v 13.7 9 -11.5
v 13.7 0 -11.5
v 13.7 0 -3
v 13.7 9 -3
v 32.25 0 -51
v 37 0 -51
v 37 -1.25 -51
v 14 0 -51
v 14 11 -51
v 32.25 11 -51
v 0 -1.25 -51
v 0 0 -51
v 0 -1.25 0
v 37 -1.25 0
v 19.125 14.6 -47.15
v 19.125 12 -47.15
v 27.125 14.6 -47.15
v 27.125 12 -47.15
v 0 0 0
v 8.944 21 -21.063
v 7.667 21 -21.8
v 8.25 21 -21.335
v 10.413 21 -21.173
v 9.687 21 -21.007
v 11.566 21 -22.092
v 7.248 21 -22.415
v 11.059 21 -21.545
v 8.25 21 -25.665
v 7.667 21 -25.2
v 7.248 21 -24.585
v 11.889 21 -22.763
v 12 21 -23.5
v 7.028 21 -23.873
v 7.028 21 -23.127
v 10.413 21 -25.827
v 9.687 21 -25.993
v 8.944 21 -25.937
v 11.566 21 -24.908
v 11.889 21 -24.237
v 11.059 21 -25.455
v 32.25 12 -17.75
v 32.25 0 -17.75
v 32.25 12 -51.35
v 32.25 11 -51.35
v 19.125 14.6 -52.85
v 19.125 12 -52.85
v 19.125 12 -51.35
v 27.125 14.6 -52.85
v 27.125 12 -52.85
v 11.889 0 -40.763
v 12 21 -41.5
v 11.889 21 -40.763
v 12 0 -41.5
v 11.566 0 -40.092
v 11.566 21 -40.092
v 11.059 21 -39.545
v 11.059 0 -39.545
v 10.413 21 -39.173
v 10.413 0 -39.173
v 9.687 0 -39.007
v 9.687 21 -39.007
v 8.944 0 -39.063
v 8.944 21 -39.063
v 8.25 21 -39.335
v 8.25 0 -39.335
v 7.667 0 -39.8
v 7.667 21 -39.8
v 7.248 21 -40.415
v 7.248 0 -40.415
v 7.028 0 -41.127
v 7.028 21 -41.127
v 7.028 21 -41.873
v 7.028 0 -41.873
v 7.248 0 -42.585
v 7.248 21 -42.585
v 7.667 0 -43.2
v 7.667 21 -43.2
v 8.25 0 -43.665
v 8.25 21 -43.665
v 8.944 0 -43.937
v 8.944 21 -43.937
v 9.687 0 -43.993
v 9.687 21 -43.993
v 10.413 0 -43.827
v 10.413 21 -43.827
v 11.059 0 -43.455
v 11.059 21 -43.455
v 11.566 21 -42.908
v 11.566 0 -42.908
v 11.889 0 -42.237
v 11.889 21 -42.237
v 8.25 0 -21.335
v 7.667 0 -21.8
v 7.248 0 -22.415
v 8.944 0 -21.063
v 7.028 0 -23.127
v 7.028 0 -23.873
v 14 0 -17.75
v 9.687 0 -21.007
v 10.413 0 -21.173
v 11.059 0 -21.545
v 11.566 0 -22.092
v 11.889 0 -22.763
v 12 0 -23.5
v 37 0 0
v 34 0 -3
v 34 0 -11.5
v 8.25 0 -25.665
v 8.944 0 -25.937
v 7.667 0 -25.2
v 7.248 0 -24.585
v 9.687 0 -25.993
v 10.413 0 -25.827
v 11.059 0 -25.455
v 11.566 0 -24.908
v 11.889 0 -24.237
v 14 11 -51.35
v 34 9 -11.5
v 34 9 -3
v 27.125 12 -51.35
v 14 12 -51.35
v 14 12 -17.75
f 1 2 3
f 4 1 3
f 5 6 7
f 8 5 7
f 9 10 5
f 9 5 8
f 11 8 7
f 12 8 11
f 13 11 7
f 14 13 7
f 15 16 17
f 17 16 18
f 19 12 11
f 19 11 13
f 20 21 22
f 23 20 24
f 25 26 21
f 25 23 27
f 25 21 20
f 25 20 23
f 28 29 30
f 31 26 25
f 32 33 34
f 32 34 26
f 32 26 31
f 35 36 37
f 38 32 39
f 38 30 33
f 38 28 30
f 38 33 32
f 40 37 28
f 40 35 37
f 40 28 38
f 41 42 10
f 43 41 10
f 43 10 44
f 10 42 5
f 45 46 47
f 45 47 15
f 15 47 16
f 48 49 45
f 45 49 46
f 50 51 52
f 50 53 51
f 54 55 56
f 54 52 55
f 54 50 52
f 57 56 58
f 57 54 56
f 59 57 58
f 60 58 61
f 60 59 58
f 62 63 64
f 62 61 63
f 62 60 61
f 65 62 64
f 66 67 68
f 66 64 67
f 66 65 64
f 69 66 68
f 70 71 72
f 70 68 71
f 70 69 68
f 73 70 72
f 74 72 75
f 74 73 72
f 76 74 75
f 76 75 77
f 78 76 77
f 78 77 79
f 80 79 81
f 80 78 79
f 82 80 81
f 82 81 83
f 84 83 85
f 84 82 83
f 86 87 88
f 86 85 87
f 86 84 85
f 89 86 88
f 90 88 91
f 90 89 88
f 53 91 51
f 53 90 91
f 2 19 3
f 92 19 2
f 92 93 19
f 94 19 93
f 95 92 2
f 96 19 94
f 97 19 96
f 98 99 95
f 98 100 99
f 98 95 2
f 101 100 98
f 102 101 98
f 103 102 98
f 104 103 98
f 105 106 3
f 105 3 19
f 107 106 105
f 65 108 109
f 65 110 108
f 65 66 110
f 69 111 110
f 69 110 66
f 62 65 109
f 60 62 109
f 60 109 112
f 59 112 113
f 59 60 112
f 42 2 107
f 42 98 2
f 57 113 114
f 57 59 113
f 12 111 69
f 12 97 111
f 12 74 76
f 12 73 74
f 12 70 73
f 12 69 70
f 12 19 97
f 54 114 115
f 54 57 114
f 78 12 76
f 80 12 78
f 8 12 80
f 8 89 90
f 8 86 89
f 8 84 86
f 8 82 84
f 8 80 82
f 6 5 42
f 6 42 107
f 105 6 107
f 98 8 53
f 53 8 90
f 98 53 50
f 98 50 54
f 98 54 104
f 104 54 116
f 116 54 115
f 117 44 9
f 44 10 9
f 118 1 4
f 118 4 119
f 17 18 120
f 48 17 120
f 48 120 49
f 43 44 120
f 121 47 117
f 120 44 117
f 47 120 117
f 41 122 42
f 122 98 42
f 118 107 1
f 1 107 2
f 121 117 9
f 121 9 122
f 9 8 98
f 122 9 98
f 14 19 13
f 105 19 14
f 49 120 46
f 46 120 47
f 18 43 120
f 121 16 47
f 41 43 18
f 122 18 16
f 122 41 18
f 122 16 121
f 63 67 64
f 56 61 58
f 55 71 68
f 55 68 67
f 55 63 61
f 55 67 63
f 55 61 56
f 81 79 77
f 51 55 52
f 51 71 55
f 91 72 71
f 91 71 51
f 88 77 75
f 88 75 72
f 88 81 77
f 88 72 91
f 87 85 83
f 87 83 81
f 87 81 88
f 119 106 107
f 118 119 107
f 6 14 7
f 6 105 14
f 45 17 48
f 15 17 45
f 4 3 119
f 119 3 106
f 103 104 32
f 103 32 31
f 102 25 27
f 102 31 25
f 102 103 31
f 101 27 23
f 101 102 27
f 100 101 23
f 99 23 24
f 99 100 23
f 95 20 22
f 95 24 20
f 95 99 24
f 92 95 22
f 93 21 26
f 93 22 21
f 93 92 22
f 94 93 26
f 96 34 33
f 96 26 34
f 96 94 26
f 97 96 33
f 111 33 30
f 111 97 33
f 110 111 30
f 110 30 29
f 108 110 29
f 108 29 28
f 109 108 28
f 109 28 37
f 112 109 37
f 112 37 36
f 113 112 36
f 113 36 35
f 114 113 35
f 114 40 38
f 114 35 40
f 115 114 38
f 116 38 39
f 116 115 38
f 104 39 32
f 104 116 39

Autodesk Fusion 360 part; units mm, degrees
sketch "Sketch1" plane through (0, 0, 0) normal (0, 1, 0) x (1, 0, 0)
  line L0 (0, 0) -> (37, 0)
  line L1 (37, 0) -> (37, 51)
  line L2 (37, 51) -> (0, 51)
  line L3 (0, 51) -> (0, 0)
  line L4 (13.7, 3) -> (34, 3)
  line L5 (34, 3) -> (34, 11.5)
  line L6 (34, 11.5) -> (13.7, 11.5)
  line L7 (13.7, 11.5) -> (13.7, 3)
  line L8 (14, 17.75) -> (32.25, 17.75)
  line L9 (32.25, 17.75) -> (32.25, 51.35)
  line L10 (32.25, 51.35) -> (14, 51.35)
  line L11 (14, 51.35) -> (14, 17.75)
  line L12 (19.125, 47.15) -> (27.125, 47.15)
  line L13 (27.125, 47.15) -> (27.125, 52.85)
  line L14 (27.125, 52.85) -> (19.125, 52.85)
  line L15 (19.125, 52.85) -> (19.125, 47.15)
  circle A0 centre (9.5, 41.5) radius 2.5
  circle A1 centre (9.5, 23.5) radius 2.5
  dimension "d1" = 37
  dimension "d2" = 51
  dimension "d3" = 3
  dimension "d4" = 3
  dimension "d5" = 20.3
  dimension "d6" = 8.5
  dimension "d7" = 6.25
  dimension "d8" = 18.25
  dimension "d9" = 4.75
  dimension "d10" = 33.6
  dimension "d11" = 5.7
  dimension "d12" = 8
  dimension "d13" = 5.125
  dimension "d15" = 1.5
  dimension "d16" = 9.5
  dimension "d17" = 9.5
  dimension "d18" = 5
  dimension "d19" = 27.5
extrude "Extrude1" add sketch "Sketch1" against normal blind 1.25 contours L0 L1 L2 L3 L8 L9 L11 | L2 L8 L9 L11 L12 L13 L15 | L2 L12 L13 L15 | L4 L5 L6 L7 | A0 | A1
extrude "Extrude2" add sketch "Sketch1" along normal blind 9 contours L4 L5 L6 L7
extrude "Extrude3" add sketch "Sketch1" along normal blind 11 contours L2 L8 L9 L11 L12 L13 L15 | L2 L12 L13 L15
sketch "Sketch3" plane through (0, 11, 0) normal (0, 1, 0) x (-1, 0, 0)
  line L0 (-32.25, -51) -> (-14, -51)
  line L1 (-14, -51) -> (-14, -17.75)
  line L2 (-14, -17.75) -> (-32.25, -17.75)
  line L3 (-32.25, -17.75) -> (-32.25, -51)
  line L4 (-14, -17.75) -> (-32.25, -17.75)
  line L5 (-32.25, -17.75) -> (-32.25, -51.35)
  line L6 (-32.25, -51.35) -> (-14, -51.35)
  line L7 (-14, -51.35) -> (-14, -17.75)
  dimension "d26" = 33.6
  dimension "d27" = 18.25
extrude "Extrude4" add sketch "Sketch3" along normal blind 1
sketch "Sketch4" plane through (0, 12, 0) normal (0, 1, 0) x (-1, 0, 0)
  line L0 (-14, -51.35) -> (-14, -17.75)
  line L1 (-14, -17.75) -> (-32.25, -17.75)
  line L2 (-32.25, -17.75) -> (-32.25, -51.35)
  line L3 (-32.25, -51.35) -> (-14, -51.35)
  line L4 (-19.125, -47.15) -> (-27.125, -47.15)
  line L5 (-27.125, -47.15) -> (-27.125, -52.85)
  line L6 (-27.125, -52.85) -> (-19.125, -52.85)
  line L7 (-19.125, -52.85) -> (-19.125, -47.15)
  line L8 (-32.25, -51.35) -> (-14, -51.35)
  dimension "d30" = 5.125
  dimension "d31" = 8
  dimension "d32" = 5.7
  dimension "d33" = 1.5
extrude "Extrude5" add sketch "Sketch4" along normal blind 2.6 contours L3 L5 L6 L7 L8 | L3 L4 L5 L7 L8
extrude "Extrude6" add sketch "Sketch1" along normal blind 21 contours A0 | A1
sketch "Sketch6" plane through (0, -1.25, 0) normal (0, -1, 0) x (1, 0, 0)
  line L0 (0, 0) -> (0, -51)
  line L1 (0, -51) -> (37, -51)
  line L2 (37, -51) -> (37, 0)
  line L3 (37, 0) -> (0, 0)
  line L4 (4, -4) -> (33, -4)
  line L5 (33, -4) -> (33, -49)
  line L6 (33, -49) -> (4, -49)
  line L7 (4, -49) -> (4, -4)
  dimension "d38" = 2
  dimension "d39" = 4
  dimension "d41" = 4
  dimension "d42" = 4
  dimension "d45" = 29
  dimension "d46" = 45
extrude "Extrude7" [suppressed]
